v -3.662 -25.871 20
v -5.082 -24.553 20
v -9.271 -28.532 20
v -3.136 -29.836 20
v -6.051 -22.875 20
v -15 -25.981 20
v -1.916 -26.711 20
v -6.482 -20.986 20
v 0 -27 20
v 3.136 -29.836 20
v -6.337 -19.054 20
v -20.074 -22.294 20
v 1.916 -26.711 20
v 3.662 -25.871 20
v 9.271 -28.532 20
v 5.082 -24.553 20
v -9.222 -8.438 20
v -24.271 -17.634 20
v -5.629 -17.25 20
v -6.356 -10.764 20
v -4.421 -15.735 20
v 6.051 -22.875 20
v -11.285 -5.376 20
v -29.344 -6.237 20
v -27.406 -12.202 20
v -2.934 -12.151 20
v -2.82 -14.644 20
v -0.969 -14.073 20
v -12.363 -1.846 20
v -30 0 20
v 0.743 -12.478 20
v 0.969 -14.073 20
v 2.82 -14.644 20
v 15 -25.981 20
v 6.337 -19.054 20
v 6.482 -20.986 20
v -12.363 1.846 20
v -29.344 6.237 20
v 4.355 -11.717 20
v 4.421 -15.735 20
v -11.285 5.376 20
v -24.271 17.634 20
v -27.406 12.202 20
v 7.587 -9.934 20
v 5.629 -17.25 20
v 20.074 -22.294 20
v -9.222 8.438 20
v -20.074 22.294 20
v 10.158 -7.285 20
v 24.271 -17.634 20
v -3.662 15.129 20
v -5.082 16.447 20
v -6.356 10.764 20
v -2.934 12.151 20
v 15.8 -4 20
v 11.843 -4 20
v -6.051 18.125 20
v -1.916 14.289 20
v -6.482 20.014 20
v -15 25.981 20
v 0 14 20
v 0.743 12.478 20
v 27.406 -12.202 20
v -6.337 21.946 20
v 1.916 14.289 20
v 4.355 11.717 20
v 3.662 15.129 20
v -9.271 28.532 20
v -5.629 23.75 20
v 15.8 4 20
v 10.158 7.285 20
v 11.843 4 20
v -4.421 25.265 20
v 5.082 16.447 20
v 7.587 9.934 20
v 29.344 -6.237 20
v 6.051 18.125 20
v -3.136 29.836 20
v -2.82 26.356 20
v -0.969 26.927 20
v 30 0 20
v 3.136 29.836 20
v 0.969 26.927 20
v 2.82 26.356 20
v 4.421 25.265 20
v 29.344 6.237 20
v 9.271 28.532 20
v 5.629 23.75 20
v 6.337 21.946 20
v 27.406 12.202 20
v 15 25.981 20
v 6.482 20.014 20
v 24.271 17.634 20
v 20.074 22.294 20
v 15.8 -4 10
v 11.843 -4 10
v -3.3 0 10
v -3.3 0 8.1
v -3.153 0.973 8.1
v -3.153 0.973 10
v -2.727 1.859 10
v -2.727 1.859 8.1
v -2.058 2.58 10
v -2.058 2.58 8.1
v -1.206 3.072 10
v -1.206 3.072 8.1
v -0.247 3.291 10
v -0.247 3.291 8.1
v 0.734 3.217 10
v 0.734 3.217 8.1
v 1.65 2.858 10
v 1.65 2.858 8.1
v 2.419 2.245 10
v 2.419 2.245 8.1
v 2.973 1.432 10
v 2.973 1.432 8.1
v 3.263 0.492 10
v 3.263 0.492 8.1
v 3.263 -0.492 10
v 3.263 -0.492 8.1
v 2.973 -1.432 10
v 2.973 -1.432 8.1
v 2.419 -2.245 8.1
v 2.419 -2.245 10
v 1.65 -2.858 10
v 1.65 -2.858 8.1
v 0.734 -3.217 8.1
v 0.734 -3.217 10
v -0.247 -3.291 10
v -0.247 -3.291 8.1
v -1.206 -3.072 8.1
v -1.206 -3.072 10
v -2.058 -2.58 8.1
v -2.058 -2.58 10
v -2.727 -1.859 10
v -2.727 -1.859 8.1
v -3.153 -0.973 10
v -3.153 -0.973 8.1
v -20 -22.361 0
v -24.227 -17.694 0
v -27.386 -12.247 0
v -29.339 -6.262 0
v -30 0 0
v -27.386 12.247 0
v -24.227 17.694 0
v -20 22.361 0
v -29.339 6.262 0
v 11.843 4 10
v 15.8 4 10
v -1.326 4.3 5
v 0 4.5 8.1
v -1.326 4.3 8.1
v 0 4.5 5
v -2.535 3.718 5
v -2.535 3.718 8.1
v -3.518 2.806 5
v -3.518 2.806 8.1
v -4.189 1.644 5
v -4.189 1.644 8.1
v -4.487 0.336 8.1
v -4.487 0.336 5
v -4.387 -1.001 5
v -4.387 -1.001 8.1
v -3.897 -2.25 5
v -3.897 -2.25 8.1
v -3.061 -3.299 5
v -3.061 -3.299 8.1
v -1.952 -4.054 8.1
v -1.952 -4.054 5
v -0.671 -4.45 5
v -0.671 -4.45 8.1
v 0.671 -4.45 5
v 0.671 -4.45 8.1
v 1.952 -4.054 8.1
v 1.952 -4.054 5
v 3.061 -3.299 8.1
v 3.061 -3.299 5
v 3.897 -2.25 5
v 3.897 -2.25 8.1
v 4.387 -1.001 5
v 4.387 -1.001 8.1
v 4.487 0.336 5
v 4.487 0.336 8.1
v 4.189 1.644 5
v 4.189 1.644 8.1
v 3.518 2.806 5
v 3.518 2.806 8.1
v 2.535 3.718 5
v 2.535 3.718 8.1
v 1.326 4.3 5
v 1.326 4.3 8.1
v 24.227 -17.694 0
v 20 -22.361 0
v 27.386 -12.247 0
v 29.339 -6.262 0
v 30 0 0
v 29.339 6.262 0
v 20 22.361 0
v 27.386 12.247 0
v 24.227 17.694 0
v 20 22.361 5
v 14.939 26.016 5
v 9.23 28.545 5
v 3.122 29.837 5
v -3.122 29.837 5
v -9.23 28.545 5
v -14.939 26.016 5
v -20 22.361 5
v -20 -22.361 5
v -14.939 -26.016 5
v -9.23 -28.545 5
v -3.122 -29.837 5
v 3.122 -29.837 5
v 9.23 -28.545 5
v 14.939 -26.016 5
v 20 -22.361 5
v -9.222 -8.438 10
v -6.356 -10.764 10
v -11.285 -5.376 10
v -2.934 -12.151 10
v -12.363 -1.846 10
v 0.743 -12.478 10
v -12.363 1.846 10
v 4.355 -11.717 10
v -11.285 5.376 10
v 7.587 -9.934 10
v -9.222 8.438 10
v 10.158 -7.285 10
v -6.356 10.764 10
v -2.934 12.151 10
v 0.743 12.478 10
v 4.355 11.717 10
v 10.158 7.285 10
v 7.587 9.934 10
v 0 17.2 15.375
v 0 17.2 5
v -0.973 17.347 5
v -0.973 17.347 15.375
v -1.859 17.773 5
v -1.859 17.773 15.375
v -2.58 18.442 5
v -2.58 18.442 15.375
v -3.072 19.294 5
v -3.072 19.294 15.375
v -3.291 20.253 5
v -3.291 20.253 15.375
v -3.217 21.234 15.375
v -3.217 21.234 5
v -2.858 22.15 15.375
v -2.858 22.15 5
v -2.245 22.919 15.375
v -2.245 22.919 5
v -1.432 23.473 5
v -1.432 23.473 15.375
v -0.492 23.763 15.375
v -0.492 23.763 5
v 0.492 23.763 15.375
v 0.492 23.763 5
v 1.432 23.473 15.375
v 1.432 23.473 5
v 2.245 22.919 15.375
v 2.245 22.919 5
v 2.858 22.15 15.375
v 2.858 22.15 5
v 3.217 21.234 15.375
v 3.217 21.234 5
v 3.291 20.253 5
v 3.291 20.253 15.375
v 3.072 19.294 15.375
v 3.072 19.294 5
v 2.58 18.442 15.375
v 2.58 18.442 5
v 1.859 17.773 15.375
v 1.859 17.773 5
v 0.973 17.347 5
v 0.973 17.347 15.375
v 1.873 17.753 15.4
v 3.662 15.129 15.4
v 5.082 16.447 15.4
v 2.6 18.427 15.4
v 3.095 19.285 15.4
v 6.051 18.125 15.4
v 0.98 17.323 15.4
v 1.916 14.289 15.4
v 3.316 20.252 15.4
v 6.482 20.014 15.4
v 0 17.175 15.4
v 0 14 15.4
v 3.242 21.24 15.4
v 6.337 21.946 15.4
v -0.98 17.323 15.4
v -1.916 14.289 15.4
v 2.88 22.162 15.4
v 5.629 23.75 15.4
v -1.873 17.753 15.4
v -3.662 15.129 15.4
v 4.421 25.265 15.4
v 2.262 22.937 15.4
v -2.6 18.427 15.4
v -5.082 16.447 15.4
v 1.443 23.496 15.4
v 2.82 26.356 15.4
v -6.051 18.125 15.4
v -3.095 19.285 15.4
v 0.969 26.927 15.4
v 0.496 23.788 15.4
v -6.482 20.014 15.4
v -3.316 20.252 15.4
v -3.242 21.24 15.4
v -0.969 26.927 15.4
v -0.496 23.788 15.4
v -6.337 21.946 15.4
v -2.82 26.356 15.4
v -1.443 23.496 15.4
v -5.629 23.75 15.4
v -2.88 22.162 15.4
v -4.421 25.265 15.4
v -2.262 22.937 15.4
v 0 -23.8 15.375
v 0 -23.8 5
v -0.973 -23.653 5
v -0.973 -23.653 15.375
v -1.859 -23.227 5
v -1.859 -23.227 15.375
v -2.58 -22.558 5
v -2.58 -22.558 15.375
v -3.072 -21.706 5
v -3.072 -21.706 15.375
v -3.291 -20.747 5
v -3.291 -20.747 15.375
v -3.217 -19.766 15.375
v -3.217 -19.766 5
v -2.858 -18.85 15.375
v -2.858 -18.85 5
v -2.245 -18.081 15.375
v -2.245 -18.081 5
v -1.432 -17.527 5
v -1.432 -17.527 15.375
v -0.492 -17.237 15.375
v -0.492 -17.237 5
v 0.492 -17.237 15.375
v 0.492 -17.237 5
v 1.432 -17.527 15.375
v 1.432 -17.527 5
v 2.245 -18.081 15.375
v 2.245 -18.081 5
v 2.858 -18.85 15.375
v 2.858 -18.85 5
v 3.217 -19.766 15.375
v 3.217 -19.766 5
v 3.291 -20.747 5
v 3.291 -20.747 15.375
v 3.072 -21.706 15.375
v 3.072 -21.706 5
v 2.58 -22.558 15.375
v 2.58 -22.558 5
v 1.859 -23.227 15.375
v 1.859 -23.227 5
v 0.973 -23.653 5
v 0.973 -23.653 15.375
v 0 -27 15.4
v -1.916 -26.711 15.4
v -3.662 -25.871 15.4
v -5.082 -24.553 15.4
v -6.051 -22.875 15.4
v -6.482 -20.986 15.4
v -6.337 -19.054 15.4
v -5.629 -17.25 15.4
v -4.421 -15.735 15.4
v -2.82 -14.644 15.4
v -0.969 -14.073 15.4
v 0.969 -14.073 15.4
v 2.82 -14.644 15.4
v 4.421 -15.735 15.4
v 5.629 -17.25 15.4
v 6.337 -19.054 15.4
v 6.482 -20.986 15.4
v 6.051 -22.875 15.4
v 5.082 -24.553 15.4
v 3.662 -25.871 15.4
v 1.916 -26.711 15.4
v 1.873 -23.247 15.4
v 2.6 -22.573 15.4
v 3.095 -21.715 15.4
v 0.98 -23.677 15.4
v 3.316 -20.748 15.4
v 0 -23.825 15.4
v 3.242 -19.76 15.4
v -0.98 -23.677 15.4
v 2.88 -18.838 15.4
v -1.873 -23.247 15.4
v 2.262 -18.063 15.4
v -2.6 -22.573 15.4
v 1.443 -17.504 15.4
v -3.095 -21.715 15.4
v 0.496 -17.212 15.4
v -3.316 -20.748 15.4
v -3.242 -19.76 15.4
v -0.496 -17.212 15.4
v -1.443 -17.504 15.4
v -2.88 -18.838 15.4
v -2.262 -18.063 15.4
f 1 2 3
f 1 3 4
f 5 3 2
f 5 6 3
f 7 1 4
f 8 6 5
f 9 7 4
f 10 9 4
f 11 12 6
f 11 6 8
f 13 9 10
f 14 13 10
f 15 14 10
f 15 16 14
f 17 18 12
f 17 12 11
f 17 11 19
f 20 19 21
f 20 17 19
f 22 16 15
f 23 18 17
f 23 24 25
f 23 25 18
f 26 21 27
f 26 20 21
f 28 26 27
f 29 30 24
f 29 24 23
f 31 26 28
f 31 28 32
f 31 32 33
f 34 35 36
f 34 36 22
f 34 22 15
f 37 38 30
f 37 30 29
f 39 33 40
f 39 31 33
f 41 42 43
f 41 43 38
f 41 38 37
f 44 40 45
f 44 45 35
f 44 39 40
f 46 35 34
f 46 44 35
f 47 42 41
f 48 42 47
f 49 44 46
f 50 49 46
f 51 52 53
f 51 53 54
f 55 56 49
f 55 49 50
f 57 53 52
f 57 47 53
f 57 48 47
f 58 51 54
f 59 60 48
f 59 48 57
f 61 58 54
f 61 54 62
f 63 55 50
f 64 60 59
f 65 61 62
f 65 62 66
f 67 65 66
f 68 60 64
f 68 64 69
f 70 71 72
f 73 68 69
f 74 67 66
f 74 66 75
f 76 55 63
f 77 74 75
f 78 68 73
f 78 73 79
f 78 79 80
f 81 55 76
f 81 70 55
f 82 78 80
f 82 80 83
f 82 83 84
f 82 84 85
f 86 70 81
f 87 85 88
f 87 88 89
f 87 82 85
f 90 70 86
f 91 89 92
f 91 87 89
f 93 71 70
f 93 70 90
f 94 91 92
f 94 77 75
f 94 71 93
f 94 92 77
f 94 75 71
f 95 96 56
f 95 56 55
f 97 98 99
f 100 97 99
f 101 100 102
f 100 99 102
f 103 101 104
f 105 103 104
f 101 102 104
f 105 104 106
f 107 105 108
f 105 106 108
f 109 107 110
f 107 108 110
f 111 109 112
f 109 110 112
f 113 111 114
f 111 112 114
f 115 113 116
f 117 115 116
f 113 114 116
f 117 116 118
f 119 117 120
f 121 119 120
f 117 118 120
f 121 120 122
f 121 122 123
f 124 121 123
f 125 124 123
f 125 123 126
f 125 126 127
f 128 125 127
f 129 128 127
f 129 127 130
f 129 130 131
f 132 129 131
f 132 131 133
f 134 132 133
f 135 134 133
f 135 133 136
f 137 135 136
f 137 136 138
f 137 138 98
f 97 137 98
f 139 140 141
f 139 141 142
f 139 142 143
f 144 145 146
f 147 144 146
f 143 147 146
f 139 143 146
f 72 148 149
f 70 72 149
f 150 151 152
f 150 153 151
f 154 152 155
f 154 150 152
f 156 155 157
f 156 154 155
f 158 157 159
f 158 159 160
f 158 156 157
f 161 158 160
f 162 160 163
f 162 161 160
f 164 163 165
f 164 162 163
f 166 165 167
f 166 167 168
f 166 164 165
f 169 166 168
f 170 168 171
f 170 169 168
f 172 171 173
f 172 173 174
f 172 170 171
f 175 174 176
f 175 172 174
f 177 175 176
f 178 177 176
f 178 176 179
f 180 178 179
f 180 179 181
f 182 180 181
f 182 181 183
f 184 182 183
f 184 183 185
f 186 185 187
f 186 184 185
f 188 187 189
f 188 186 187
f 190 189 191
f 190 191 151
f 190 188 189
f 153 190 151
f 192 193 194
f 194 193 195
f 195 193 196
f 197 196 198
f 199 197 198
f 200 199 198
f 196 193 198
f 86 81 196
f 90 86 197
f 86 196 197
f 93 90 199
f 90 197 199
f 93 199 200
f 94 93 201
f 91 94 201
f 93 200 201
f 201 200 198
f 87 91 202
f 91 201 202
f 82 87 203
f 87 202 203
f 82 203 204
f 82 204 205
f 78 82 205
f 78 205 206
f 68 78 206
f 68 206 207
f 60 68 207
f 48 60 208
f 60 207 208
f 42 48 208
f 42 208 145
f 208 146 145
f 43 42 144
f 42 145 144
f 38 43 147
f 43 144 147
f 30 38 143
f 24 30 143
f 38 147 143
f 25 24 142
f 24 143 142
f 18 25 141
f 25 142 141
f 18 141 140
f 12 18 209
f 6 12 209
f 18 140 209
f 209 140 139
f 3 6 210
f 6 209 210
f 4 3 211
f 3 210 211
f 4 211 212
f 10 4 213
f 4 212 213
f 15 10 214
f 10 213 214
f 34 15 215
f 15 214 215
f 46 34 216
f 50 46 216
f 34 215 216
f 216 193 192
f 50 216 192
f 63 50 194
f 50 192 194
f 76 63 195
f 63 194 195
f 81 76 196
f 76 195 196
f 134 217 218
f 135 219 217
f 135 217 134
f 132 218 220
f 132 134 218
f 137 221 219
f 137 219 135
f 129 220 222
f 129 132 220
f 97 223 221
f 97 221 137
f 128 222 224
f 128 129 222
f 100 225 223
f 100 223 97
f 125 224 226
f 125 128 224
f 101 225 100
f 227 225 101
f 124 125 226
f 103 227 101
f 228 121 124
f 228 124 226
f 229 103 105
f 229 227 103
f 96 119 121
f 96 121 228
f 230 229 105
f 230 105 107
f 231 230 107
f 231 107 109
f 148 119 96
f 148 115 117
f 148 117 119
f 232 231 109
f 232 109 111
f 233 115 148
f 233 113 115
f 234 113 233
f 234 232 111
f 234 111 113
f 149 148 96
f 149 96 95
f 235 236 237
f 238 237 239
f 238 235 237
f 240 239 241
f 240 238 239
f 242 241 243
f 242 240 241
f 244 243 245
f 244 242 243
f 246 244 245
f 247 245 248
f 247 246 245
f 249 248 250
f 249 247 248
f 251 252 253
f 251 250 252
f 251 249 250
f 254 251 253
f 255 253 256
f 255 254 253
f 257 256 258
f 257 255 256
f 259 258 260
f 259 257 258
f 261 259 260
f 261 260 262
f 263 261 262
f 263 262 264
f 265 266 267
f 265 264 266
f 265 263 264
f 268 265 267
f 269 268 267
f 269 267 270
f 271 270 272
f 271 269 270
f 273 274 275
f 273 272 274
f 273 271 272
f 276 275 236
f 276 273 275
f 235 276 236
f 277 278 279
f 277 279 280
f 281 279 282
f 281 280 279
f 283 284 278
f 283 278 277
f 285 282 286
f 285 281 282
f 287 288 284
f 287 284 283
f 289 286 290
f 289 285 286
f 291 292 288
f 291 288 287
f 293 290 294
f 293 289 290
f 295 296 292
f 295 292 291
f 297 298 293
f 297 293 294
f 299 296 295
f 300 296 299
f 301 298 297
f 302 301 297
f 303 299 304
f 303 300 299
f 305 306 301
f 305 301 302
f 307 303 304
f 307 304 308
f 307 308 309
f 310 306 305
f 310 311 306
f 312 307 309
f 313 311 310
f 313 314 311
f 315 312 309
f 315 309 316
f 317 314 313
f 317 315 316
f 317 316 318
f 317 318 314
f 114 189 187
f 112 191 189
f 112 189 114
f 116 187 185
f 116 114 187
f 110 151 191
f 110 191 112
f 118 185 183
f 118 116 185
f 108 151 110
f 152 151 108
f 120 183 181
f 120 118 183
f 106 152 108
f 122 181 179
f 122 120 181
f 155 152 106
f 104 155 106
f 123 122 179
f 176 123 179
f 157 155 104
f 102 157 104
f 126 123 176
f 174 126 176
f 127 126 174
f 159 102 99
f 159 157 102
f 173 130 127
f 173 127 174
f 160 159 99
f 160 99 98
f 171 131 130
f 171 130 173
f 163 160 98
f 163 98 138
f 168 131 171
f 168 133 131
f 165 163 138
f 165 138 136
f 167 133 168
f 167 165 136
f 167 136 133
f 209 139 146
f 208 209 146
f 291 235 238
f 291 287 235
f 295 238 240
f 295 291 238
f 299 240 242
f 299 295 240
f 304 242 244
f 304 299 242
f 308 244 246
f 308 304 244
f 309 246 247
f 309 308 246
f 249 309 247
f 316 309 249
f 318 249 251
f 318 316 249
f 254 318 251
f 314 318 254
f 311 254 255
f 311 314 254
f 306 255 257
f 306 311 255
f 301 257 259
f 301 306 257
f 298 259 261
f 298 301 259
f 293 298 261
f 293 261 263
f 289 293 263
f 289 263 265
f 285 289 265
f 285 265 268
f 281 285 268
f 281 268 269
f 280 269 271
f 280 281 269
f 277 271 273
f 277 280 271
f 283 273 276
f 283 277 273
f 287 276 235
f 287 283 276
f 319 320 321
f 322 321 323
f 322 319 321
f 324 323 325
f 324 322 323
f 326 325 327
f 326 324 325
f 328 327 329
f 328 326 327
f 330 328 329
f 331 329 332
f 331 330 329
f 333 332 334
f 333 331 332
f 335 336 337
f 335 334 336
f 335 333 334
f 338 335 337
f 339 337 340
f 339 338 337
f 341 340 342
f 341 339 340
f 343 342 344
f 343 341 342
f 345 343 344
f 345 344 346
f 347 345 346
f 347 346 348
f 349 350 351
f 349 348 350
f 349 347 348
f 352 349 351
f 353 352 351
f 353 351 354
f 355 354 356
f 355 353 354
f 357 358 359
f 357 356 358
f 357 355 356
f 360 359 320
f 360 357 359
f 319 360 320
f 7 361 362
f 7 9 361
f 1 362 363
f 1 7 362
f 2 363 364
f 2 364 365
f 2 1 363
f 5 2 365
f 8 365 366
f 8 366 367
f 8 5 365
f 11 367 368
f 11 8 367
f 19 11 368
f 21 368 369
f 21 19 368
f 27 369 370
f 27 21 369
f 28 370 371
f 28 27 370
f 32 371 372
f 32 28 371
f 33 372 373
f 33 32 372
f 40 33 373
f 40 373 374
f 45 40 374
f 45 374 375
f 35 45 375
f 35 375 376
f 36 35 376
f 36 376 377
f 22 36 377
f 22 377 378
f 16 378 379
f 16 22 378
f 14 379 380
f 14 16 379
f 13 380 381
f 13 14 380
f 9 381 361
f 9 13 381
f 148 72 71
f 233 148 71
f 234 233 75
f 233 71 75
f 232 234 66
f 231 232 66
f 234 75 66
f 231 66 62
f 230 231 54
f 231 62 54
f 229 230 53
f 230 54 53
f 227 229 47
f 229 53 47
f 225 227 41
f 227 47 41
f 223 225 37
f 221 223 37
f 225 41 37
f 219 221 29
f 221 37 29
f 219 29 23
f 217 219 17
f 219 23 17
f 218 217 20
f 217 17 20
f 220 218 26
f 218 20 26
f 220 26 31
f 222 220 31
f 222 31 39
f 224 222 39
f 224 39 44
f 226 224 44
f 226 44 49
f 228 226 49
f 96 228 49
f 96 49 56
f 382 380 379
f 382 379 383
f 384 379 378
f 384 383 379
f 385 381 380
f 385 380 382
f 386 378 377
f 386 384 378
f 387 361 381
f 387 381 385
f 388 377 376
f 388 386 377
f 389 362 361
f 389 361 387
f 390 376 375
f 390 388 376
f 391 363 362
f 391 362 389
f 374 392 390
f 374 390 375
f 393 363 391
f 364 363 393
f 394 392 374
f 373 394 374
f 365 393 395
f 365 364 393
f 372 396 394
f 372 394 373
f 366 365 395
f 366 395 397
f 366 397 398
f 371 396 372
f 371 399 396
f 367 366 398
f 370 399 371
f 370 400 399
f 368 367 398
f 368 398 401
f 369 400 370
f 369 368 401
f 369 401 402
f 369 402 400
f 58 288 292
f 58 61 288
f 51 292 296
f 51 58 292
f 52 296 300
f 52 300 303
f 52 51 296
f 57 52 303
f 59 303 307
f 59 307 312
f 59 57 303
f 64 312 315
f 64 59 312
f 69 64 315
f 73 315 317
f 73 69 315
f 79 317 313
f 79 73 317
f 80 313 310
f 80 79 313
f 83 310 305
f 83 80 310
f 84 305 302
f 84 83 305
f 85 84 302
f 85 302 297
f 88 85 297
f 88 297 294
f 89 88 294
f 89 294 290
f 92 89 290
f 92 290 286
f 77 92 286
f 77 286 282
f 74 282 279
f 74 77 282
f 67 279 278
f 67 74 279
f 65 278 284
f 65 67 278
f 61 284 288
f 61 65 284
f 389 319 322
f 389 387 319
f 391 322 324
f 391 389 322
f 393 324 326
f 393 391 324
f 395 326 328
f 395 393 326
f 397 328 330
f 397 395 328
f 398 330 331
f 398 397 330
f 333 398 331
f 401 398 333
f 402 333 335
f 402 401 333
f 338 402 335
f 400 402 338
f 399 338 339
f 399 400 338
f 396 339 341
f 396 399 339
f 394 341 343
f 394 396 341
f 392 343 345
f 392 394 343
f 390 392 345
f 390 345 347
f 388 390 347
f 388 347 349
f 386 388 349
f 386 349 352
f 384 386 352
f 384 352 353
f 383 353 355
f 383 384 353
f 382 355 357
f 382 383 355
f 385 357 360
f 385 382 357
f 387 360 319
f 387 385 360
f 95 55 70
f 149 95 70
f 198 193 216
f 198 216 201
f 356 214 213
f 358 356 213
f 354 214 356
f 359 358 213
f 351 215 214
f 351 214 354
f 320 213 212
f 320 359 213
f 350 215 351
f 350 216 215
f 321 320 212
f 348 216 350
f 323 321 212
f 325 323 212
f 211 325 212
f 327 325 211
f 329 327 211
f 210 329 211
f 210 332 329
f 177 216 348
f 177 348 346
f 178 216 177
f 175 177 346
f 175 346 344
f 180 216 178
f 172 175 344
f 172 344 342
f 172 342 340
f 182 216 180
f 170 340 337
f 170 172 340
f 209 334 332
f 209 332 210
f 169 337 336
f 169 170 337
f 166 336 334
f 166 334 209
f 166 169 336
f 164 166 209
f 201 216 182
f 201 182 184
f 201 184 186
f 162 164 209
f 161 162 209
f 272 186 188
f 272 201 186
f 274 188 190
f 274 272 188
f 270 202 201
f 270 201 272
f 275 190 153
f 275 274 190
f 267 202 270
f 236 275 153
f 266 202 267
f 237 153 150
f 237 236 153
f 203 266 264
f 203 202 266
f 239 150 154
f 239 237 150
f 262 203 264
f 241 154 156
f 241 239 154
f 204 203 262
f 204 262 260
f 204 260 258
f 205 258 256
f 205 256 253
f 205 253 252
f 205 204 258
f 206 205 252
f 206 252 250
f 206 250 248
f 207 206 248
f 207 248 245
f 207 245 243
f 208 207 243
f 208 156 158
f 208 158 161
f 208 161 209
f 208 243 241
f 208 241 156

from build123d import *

# Parameters (mm, degrees)
ESQUISSE1_R                                  = 30
BOSS_EXTRU_1_DEPTH                           = 20
ESQUISSE2_W                                  = 40
ESQUISSE2_H                                  = 78.633630418
ENL_V_MAT_EXTRU_1_DEPTH                      = 5
ESQUISSE3_R                                  = 12.5
ENL_V_MAT_EXTRU_2_DEPTH                      = 10
D_GAGEMENT_M61_D                             = 6.6
CHAMBRAGE_POUR_VIS_T_TE_RONDE_BOMB_2_A_COUNT = 2
CHAMBRAGE_POUR_VIS_T_TE_RONDE_BOMB_2_A_PITCH = 41
ESQUISSE11_W                                 = 6
ESQUISSE11_H                                 = 8
ENL_V_MAT_EXTRU_8_DEPTH                      = 10


with BuildPart() as part:
    # Esquisse1 → Boss.-Extru.1 (new body)
    with BuildSketch(Plane.XY):
        Circle(ESQUISSE1_R)
    extrude(amount=BOSS_EXTRU_1_DEPTH)

    # Esquisse2 → Enlèv. mat.-Extru.1 (cut)
    with BuildSketch(Plane(origin=(0, 0, 0), x_dir=(-1, 0, 0), z_dir=(0, 0, -1))):
        Rectangle(ESQUISSE2_W, ESQUISSE2_H)
    extrude(amount=-ENL_V_MAT_EXTRU_1_DEPTH, mode=Mode.SUBTRACT)

    # Esquisse3 → Enlèv. mat.-Extru.2 (cut)
    with BuildSketch(Plane.XY.offset(20)):
        Circle(ESQUISSE3_R)
    extrude(amount=-ENL_V_MAT_EXTRU_2_DEPTH, mode=Mode.SUBTRACT)

    # Dégagement M61 (through all)
    with Locations(Plane.XY.offset(10)):
        with Locations((0, 0)):
            Hole(D_GAGEMENT_M61_D / 2)

    # Esquisse7 → Chambrage pour vis _ t_te ronde bomb_e M (revolve, cut)
    with BuildSketch(Plane(origin=(0, 0, 5), x_dir=(0, 1, 0), z_dir=(1, 0, 0))):
        Polygon((0, 0), (0, 15), (2.25, 15), (2.25, 3.125), (2.275, 3.1), (4.5, 3.1), (4.5, 0), align=None)
    revolve(axis=Axis((0, 0, -1.35), (0, 0, 1)), mode=Mode.SUBTRACT)

    # Esquisse9 → Chambrage pour vis _ t_te ronde bomb 2 (revolve, cut)
    with BuildSketch(Plane(origin=(0, -20.5, 20), x_dir=(0, -1, 0), z_dir=(1, 0, 0))):
        Polygon((0, 0), (0, 20), (3.3, 20), (3.3, 4.625), (3.325, 4.6), (6.5, 4.6), (6.5, 0), align=None)
    chambrage_pour_vis_t_te_ronde_bomb_2 = revolve(axis=Axis((0, -20.5, 26.35), (0, 0, -1)), mode=Mode.SUBTRACT)

    # Chambrage pour vis _ t_te ronde bomb 2 a: Chambrage pour vis _ t_te ronde bomb 2 ×2
    with Locations(*[(0, i * CHAMBRAGE_POUR_VIS_T_TE_RONDE_BOMB_2_A_PITCH, 0) for i in range(1, CHAMBRAGE_POUR_VIS_T_TE_RONDE_BOMB_2_A_COUNT)]):
        add(chambrage_pour_vis_t_te_ronde_bomb_2, mode=Mode.SUBTRACT)

    # Esquisse11 → Enlèv. mat.-Extru.8 (cut)
    with BuildSketch(Plane.XY.offset(20)):
        with Locations((12.8, 0)):
            Rectangle(ESQUISSE11_W, ESQUISSE11_H)
    extrude(amount=-ENL_V_MAT_EXTRU_8_DEPTH, mode=Mode.SUBTRACT)


solid = part.part
